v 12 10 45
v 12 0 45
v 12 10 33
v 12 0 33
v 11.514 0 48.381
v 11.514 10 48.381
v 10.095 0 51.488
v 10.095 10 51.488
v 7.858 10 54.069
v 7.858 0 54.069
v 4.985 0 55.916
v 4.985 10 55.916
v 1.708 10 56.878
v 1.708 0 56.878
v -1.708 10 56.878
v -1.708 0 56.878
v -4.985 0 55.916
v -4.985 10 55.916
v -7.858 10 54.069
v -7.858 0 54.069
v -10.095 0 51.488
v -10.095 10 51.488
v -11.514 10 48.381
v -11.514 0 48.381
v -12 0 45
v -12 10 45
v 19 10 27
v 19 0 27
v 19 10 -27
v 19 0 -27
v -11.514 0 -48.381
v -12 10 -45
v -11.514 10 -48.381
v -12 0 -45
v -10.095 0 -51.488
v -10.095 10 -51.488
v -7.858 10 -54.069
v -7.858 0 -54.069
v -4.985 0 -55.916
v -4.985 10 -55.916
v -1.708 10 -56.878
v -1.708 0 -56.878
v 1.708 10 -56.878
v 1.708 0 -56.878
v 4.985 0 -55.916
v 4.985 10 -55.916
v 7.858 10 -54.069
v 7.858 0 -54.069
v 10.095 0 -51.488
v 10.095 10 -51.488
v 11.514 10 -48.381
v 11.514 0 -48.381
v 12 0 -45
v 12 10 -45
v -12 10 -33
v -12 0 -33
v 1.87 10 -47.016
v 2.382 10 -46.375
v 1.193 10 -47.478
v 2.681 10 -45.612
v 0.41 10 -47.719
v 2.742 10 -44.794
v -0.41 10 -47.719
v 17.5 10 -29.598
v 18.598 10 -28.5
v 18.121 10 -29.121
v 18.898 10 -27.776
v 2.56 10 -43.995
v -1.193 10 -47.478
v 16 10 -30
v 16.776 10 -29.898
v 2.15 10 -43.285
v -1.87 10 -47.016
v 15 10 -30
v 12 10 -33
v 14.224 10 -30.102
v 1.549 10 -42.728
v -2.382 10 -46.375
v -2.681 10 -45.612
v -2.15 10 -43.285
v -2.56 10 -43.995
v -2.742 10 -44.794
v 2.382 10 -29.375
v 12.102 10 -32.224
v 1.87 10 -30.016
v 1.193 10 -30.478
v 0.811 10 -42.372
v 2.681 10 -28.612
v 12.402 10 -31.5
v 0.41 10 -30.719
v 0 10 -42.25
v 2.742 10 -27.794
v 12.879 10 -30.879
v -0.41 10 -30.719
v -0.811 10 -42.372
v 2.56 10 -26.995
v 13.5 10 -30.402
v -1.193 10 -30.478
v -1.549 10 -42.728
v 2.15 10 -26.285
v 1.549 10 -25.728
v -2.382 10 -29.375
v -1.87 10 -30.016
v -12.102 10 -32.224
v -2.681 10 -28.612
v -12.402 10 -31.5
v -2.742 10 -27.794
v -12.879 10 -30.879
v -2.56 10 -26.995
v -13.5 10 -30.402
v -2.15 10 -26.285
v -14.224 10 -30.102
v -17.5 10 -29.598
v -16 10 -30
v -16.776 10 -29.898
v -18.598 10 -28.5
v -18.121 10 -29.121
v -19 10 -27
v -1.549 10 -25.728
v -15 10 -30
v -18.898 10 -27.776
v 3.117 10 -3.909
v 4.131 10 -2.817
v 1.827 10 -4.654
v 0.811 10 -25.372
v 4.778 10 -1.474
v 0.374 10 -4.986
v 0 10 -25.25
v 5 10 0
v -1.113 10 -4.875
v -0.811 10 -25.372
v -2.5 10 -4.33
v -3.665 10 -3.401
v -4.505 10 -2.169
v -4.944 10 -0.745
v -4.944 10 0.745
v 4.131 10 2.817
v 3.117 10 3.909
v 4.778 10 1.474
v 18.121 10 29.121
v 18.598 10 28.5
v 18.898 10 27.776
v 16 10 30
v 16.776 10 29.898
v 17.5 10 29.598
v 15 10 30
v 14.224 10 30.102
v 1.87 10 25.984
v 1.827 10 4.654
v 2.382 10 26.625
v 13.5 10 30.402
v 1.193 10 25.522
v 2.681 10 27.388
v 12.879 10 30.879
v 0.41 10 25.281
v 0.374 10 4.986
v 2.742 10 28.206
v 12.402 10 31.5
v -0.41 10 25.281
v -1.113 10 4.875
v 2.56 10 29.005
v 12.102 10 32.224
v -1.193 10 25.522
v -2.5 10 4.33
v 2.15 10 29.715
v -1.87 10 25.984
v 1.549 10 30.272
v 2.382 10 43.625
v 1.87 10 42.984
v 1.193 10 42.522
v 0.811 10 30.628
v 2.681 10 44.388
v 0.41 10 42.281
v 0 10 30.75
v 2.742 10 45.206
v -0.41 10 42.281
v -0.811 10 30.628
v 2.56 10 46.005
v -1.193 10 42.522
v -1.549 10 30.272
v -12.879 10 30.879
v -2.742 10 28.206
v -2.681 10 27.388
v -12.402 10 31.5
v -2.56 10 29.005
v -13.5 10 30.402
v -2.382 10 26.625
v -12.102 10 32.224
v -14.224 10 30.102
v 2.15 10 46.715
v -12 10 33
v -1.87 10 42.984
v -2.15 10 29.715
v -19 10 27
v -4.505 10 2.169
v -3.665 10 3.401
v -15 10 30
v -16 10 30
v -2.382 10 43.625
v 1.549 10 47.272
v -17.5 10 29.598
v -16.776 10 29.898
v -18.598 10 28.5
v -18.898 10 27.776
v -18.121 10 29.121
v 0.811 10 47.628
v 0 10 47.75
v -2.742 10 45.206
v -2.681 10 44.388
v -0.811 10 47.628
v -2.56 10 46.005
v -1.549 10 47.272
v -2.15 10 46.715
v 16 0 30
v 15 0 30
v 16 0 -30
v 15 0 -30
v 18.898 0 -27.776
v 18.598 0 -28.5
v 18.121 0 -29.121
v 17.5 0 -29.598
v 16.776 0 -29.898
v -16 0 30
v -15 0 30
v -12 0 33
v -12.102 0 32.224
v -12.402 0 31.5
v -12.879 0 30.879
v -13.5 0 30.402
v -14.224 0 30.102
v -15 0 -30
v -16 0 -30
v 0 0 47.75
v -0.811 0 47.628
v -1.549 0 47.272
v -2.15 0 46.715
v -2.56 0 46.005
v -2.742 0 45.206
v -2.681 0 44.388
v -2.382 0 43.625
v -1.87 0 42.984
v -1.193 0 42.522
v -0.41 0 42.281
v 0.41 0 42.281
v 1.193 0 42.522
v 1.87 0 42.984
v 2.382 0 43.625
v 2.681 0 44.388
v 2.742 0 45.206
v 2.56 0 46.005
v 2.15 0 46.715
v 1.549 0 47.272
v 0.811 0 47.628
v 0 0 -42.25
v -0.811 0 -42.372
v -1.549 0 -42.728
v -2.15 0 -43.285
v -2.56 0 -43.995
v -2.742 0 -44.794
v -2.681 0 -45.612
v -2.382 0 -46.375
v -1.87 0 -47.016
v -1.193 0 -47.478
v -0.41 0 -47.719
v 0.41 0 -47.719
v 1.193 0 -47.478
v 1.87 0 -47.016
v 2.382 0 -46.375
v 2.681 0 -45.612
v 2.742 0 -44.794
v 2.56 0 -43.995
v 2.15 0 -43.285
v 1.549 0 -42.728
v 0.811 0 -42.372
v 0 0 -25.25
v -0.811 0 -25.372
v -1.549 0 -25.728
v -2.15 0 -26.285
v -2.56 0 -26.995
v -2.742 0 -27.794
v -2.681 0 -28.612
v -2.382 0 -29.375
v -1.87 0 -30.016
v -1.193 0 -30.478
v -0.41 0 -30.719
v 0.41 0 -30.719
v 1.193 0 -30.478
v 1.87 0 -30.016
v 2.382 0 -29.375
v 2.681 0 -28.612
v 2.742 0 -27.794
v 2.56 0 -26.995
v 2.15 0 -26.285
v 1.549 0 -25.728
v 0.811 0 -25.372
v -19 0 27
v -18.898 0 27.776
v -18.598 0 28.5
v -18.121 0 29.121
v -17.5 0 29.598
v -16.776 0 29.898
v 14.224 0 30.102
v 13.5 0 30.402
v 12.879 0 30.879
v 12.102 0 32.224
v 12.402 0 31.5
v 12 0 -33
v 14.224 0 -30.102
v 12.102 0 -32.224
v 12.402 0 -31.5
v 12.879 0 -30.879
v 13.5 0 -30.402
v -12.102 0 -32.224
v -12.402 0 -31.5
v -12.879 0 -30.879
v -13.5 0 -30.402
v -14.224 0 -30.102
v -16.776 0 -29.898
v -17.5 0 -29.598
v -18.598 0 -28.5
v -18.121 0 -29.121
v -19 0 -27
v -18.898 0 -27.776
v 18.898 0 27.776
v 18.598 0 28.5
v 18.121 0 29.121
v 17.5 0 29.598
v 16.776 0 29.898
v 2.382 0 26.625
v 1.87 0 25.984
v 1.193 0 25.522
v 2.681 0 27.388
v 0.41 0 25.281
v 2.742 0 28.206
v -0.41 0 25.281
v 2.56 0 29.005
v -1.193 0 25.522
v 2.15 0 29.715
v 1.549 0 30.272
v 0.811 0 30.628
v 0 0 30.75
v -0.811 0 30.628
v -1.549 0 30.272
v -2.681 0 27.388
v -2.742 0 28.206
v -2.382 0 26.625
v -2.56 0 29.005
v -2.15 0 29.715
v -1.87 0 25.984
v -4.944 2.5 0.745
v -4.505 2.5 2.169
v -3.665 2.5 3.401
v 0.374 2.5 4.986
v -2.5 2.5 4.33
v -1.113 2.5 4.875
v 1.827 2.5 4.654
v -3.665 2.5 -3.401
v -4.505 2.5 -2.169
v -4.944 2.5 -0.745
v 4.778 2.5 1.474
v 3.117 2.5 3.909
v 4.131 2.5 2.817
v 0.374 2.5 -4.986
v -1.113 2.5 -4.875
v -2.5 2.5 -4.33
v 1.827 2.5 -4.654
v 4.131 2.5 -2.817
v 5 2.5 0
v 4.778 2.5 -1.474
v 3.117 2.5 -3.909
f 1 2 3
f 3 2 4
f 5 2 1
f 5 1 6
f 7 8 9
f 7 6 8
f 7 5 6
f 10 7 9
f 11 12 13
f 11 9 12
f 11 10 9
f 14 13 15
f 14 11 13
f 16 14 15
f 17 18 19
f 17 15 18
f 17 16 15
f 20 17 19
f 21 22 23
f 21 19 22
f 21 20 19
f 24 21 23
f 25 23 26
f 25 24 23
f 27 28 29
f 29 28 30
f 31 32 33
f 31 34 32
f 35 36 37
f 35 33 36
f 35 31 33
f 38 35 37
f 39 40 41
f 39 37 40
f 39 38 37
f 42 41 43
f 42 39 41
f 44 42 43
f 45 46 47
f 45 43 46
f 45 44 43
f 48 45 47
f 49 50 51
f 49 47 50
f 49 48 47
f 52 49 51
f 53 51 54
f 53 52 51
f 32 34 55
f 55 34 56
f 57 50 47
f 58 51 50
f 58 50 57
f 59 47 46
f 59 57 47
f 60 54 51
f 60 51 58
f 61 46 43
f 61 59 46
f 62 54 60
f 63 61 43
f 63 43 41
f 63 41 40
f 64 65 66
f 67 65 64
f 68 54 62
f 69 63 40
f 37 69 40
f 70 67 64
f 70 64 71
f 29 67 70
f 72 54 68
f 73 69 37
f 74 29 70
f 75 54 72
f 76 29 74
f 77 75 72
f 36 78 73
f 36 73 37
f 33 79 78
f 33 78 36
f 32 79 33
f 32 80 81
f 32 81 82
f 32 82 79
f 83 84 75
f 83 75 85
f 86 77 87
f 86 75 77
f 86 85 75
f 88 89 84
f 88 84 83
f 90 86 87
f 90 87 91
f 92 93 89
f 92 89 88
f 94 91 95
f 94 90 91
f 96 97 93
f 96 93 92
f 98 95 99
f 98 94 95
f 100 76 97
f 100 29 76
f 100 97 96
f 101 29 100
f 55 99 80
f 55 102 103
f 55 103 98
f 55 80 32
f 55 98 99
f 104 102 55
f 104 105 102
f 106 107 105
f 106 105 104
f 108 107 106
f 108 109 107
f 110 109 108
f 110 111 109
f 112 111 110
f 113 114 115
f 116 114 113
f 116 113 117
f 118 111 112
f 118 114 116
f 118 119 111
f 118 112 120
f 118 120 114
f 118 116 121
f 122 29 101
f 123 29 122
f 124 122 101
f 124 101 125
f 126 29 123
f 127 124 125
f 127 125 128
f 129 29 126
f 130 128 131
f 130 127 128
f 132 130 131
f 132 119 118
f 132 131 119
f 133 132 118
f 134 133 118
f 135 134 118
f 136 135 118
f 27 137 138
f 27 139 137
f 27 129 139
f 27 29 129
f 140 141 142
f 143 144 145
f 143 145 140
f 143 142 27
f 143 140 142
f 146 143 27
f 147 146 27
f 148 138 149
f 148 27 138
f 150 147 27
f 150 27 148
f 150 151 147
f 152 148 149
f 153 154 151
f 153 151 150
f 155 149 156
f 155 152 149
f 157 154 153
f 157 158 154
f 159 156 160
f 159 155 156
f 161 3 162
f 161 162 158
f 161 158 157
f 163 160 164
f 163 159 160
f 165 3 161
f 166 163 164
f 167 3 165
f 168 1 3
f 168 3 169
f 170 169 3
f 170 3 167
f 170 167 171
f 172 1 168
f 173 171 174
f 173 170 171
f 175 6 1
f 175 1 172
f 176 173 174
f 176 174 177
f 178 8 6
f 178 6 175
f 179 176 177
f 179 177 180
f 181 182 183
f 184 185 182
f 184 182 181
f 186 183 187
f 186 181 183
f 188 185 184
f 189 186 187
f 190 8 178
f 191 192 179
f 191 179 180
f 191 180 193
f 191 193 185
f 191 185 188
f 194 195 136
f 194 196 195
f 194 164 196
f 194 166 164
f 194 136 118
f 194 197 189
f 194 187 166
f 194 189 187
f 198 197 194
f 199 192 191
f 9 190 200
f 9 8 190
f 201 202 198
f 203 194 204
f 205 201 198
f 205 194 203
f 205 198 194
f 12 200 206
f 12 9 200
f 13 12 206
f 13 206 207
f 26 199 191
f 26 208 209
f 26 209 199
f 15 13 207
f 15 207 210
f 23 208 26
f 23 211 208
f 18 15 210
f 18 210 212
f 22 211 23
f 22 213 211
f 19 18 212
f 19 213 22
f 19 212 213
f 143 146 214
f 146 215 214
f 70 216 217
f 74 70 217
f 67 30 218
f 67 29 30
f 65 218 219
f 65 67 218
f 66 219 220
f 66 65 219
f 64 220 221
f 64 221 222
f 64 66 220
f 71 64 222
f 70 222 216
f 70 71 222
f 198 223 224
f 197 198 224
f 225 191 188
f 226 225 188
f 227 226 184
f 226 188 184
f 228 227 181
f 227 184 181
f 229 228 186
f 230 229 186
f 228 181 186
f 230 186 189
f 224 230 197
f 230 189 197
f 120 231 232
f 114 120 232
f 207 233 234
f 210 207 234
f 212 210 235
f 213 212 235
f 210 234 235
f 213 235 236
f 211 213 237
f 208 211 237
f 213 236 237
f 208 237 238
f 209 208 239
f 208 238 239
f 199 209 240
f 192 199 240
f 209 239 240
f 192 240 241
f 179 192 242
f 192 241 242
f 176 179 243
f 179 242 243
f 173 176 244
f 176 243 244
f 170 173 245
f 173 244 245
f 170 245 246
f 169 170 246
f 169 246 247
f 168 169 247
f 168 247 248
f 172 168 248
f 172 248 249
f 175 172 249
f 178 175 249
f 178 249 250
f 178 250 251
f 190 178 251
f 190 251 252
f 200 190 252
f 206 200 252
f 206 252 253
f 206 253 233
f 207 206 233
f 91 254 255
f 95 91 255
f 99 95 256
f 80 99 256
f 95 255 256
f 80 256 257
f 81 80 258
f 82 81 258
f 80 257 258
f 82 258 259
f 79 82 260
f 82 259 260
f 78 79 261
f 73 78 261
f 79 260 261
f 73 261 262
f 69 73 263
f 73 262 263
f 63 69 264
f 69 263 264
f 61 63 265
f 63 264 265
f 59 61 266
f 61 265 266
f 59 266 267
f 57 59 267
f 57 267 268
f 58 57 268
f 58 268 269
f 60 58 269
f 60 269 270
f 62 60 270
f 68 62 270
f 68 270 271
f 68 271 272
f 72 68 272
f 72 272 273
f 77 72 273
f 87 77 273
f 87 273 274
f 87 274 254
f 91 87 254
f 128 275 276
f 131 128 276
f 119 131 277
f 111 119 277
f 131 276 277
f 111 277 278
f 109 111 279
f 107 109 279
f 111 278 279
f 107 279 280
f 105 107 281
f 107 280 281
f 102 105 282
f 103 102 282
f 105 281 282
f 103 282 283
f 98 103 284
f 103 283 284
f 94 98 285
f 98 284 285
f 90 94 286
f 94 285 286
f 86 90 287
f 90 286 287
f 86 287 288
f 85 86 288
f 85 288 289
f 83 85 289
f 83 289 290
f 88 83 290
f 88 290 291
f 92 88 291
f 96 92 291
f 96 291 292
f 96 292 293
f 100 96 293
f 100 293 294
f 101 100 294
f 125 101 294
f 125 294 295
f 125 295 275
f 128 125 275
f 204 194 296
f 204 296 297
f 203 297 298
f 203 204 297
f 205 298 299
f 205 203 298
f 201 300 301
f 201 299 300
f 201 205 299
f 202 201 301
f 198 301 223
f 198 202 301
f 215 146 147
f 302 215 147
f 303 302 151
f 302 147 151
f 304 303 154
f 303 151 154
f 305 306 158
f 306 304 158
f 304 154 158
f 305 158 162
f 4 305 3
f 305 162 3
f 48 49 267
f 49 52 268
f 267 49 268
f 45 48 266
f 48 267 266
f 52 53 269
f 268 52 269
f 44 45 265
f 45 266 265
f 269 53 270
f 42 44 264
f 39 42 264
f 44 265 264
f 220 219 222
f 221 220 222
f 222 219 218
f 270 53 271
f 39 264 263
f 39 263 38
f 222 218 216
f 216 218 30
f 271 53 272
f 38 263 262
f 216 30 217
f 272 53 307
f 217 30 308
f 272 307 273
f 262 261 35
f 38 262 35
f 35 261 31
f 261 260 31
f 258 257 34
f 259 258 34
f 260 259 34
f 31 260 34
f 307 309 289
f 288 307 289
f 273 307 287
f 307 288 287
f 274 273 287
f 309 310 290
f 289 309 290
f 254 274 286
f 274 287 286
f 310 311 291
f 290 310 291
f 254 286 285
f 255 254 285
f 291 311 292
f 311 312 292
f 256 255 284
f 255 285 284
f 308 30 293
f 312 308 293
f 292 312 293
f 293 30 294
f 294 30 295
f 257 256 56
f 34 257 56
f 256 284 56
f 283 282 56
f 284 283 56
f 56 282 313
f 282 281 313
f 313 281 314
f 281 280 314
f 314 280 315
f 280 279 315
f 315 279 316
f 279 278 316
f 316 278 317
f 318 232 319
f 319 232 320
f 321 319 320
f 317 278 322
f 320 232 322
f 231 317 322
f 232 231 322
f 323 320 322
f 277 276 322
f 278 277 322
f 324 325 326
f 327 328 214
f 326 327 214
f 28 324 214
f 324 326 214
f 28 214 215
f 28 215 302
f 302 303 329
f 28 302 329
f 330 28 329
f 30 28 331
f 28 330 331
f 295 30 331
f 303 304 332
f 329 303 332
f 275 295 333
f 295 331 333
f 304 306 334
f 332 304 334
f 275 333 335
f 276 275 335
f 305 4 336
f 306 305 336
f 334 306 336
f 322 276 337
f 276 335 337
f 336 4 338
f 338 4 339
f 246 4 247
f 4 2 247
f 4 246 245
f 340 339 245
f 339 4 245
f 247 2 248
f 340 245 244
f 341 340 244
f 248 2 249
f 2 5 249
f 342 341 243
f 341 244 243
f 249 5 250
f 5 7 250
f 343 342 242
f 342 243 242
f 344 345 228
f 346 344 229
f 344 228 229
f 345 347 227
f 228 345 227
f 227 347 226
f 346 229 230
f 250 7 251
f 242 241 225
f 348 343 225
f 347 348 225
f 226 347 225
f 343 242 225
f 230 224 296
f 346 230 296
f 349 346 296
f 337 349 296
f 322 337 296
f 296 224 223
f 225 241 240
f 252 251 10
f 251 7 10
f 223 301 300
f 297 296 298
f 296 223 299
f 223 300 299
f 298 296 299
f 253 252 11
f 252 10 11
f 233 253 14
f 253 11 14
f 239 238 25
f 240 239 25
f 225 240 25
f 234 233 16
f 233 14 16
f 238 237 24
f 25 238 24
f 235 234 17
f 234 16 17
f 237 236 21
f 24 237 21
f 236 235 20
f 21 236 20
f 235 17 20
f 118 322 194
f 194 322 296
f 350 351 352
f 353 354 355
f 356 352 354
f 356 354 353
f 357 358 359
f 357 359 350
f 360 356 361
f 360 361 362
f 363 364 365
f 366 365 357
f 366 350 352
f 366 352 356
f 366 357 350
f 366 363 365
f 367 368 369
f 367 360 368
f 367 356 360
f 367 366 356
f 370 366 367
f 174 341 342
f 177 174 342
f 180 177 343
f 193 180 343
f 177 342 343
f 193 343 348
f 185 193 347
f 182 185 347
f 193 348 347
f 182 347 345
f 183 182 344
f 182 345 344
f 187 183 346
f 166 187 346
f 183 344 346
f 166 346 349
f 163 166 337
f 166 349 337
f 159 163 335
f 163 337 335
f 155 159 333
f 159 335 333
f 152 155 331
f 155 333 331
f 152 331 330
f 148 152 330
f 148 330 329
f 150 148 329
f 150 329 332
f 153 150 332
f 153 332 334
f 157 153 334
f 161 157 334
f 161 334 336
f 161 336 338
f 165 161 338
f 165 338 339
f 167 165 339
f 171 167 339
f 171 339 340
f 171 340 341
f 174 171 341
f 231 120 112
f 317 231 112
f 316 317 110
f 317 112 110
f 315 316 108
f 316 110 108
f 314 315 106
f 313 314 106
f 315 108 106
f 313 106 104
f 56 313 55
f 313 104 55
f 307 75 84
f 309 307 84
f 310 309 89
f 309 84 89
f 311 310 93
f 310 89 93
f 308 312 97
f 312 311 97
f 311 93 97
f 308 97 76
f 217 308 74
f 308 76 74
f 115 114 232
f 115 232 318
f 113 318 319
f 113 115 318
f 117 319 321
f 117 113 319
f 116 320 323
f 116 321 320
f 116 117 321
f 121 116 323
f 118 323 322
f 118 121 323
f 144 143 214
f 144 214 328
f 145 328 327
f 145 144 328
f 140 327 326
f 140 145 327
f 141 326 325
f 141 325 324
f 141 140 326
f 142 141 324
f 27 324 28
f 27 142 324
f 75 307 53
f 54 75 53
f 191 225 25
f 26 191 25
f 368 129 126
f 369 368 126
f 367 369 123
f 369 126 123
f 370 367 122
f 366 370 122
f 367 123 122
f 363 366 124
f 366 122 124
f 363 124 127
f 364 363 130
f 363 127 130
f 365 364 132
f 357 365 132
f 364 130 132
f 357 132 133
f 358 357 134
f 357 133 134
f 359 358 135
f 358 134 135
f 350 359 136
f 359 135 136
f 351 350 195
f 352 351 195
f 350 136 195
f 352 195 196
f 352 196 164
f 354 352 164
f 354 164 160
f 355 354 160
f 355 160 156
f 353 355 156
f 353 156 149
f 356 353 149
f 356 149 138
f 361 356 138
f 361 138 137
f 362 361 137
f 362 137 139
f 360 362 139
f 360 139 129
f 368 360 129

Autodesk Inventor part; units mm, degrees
ref_plane "YZ Plane" through (0, 0, 0) normal (1, 0, 0) x (0, 1, 0)
ref_plane "XZ Plane" through (0, 0, 0) normal (0, 1, 0) x (-1, 0, 0)
ref_plane "XY Plane" through (0, 0, 0) normal (0, 0, 1) x (1, 0, 0)
sketch "Sketch1" plane through (0, 0, 0) normal (0, 1, 0) x (-1, 0, 0)
  line L0 (0, 45) -> (0, -45) construction
  line L1 (-12, 45) -> (-12, -45)
  line L2 (12, -45) -> (12, 45)
  arc A0 (12, 45) -> (-12, 45) centre (0, 45) ccw
  arc A1 (-12, -45) -> (12, -45) centre (0, -45) ccw
  line L3 (-19, 30) -> (-19, -30)
  line L4 (-19, -30) -> (19, -30)
  line L5 (19, -30) -> (19, 30)
  line L6 (19, 30) -> (-19, 30)
  line L7 (-19, 30) -> (19, -30) construction
  line L8 (-19, -30) -> (19, 30) construction
  point P0 (0, 0)
  point P1 (-12, 30)
  point P2 (-12, -30)
  point P3 (12, -30)
  point P4 (12, 30)
  dimension "d0" = 60
  dimension "d1" = 90
  dimension "d2" = 12
  dimension "d3" = 38
extrude "Extrusion1" add sketch "Sketch1" along normal blind 10
sketch "Sketch2" plane through (0, 10, 0) normal (0, 1, 0) x (1, 0, 0)
  line L0 (19, -30) -> (19, 30) projected
  line L1 (19, 30) -> (12, 30) projected
  line L2 (12, 30) -> (12, 45) projected
  arc A0 (12, 45) -> (-12, 45) centre (0, 45) ccw projected
  line L3 (-12, 45) -> (-12, 30) projected
  line L4 (-12, 30) -> (-19, 30) projected
  line L5 (-19, 30) -> (-19, -30) projected
  line L6 (-19, -30) -> (-12, -30) projected
  line L7 (-12, -30) -> (-12, -45) projected
  arc A1 (-12, -45) -> (12, -45) centre (0, -45) ccw projected
  line L8 (12, -45) -> (12, -30) projected
  line L9 (12, -30) -> (19, -30) projected
  line L10 (0, -28) -> (0, 28)
  line L11 (0, 0) -> (-19, 0)
  line L12 (-19, 30) -> (-19, -30) projected
  dimension "d6" = 56
hole "Hole1" at (0, 10, 28) at (0, 10, -28) direction (0, -1, 0) diameter 5.5 end through all
fillet "Fillet1" radius 3 8 edges at (19, 5, 30) (19, 5, -30) (12, 5, 30) (-19, 5, 30) (-12, 5, 30) (-19, 5, -30) (-12, 5, -30) (12, 5, -30)
sketch "Sketch3" plane through (0, 10, 0) normal (0, 1, 0) x (1, 0, 0)
  arc A0 (-12, -45) -> (12, -45) centre (0, -45) ccw projected
  arc A1 (12, 45) -> (-12, 45) centre (0, 45) ccw projected
  point P0 (0, 0)
hole "Hole2" at (0, 10, 45) at (0, 10, -45) direction (0, -1, 0) diameter 5.5 end through all
sketch "Sketch4" plane through (0, 10, 0) normal (0, 1, 0) x (1, 0, 0)
  circle A0 centre (0, 0) radius 5
  dimension "d22" = 10
extrude "Extrusion2" cut sketch "Sketch4" against normal blind 7.5
properties part number "11_Mieng_go_dem_lo_xo"
